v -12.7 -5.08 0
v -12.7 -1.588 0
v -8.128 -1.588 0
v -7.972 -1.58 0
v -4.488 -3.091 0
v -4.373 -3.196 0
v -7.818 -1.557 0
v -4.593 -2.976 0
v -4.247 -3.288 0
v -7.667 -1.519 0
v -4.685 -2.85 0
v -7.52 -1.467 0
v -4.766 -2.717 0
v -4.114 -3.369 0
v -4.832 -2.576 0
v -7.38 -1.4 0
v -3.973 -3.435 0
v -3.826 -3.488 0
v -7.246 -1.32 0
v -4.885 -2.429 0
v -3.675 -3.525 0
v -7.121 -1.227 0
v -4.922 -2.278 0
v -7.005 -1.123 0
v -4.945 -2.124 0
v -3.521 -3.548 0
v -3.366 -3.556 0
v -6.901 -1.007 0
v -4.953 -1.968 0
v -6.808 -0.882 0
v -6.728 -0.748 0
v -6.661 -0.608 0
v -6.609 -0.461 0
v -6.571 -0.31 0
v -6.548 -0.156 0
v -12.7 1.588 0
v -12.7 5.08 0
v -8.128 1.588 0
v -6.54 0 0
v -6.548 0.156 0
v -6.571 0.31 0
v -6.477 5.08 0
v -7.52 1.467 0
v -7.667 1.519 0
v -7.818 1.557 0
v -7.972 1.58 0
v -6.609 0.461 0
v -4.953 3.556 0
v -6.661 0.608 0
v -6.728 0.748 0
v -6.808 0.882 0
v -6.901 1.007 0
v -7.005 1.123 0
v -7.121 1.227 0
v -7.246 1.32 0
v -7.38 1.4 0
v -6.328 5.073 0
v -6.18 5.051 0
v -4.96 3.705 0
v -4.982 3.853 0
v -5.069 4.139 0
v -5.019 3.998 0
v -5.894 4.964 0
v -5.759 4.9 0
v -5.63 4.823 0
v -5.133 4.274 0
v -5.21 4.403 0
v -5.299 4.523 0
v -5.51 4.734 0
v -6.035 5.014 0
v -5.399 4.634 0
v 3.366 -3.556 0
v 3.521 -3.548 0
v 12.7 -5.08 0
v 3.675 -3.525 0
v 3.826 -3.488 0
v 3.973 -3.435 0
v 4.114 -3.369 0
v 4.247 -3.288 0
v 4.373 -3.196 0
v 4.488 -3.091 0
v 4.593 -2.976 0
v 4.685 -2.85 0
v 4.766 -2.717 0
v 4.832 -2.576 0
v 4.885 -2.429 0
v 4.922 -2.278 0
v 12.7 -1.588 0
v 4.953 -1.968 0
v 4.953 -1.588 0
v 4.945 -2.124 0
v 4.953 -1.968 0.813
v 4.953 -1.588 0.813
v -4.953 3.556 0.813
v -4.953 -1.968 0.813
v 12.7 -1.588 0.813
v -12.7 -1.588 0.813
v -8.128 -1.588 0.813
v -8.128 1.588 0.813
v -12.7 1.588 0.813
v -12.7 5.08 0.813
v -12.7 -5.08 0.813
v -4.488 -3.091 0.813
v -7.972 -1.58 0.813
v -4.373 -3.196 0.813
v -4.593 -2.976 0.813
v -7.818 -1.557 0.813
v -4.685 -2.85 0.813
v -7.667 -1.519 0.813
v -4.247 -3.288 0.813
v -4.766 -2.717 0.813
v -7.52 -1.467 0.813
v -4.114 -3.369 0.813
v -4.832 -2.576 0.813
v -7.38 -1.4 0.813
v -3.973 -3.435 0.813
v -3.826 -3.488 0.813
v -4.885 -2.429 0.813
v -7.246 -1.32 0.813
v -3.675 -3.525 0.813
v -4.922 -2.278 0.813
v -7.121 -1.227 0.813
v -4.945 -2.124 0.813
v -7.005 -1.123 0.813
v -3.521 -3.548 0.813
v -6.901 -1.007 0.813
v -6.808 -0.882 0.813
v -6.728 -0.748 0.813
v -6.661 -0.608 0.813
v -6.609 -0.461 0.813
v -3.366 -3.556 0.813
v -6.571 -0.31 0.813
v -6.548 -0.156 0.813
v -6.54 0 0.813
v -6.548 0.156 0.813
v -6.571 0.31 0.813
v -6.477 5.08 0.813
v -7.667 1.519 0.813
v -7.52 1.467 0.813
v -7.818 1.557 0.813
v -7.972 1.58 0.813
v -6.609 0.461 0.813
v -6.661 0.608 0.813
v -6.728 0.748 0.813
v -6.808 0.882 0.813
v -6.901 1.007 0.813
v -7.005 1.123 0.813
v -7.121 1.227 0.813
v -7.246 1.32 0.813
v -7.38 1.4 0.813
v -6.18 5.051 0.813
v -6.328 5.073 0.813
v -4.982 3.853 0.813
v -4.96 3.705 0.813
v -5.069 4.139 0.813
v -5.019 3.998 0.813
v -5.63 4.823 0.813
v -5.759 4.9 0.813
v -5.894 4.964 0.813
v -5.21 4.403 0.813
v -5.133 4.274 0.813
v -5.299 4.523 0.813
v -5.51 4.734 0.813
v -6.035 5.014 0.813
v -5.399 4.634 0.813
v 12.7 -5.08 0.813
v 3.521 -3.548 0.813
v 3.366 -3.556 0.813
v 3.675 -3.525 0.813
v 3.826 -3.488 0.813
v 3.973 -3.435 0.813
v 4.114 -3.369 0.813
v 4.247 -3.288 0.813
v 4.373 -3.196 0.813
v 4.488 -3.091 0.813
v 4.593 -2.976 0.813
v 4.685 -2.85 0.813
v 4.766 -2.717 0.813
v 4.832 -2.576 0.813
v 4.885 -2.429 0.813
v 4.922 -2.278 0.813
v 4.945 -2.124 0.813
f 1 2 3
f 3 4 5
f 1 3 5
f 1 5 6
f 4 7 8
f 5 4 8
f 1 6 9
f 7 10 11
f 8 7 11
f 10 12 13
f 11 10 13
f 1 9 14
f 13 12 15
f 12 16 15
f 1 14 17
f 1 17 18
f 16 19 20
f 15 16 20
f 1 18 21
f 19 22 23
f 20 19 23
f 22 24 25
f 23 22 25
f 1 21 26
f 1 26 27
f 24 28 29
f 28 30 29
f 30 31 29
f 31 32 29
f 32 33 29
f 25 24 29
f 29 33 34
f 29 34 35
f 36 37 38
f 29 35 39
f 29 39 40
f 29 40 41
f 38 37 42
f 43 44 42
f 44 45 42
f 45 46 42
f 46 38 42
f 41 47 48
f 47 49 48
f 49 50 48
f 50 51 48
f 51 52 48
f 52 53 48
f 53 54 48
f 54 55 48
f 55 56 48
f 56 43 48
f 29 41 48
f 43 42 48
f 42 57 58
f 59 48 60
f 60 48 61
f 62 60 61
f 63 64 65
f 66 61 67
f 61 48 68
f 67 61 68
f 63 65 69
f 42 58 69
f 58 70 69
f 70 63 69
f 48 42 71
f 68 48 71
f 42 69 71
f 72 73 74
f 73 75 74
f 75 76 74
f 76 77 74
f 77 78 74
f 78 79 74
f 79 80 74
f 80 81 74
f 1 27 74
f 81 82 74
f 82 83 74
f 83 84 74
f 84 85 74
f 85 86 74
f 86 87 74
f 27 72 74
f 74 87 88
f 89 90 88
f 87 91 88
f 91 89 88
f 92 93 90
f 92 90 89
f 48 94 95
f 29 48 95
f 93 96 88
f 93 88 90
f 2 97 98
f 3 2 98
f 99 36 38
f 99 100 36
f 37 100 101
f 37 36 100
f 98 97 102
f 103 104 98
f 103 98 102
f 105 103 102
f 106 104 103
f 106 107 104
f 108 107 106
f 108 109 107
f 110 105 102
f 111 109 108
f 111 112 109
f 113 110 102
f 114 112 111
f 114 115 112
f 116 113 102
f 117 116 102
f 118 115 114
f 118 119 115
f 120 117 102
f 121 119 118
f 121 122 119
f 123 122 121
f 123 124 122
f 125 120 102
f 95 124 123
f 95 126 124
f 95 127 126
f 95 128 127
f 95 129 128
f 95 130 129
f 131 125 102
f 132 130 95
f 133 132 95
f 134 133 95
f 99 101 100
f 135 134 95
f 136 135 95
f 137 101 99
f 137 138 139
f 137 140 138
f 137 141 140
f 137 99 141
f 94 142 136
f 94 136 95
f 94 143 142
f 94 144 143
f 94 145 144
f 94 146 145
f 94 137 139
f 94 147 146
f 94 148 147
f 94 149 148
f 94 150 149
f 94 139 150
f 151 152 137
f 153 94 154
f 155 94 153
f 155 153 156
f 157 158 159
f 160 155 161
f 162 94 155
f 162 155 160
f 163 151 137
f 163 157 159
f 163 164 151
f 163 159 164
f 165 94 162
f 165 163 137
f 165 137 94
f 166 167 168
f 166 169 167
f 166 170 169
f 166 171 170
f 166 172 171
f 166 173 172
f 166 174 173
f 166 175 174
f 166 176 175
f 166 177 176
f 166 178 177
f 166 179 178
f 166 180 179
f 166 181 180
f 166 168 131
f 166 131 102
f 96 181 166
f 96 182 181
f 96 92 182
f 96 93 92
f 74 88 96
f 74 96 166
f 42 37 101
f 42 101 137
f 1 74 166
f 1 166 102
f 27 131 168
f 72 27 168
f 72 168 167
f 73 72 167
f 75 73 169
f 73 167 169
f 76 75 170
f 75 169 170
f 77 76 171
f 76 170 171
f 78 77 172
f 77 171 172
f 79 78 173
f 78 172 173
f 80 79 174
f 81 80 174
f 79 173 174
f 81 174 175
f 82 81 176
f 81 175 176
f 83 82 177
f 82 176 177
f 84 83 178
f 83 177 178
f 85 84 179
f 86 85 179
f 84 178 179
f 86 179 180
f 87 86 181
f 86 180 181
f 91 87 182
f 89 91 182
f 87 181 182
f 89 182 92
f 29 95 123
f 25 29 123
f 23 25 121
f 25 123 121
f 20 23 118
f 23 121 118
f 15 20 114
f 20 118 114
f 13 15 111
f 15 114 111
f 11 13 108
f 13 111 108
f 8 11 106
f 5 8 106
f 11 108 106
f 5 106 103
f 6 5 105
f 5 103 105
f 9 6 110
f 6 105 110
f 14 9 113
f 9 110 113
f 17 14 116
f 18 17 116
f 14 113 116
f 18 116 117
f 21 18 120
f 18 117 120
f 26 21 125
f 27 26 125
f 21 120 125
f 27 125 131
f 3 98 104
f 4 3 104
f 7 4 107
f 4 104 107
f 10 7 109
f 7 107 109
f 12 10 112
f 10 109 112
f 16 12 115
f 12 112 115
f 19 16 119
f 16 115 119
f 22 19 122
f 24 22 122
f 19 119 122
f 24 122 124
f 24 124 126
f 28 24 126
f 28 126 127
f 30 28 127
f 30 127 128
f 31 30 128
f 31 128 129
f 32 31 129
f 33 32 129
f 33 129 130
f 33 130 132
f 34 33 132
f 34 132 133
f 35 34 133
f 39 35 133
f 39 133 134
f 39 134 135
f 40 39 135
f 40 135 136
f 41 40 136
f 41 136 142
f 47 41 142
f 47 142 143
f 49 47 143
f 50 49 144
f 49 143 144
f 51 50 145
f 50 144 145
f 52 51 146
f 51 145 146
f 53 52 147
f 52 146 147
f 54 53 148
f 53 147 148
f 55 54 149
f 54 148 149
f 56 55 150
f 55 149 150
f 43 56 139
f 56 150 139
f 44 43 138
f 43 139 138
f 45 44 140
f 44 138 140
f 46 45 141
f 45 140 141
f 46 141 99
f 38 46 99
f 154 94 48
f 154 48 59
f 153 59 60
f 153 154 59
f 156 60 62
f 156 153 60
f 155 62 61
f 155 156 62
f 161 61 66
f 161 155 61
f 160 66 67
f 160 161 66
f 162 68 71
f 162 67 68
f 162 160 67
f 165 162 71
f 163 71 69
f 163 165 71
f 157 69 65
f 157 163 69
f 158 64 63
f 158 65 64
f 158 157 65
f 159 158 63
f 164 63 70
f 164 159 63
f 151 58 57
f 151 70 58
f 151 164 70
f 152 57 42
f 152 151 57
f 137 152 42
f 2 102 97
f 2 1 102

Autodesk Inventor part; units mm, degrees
ref_plane "YZ Plane" through (0, 0, 0) normal (1, 0, 0) x (0, 1, 0)
ref_plane "XZ Plane" through (0, 0, 0) normal (0, 1, 0) x (-1, 0, 0)
sketch "Sketch1" plane through (0, 0, 0) normal (0, 0, 1) x (1, 0, 0)
  line L0 (-12.7, 5.08) -> (12.7, 5.08)
  line L1 (12.7, 5.08) -> (12.7, -5.08)
  line L2 (12.7, -5.08) -> (-12.7, -5.08)
  line L3 (-12.7, -5.08) -> (-12.7, 5.08)
  point P0 (0, 0)
  point P1 (0, 5.08)
  point P2 (-12.7, 0)
  dimension "d0" = 25.4
  dimension "d1" = 10.16
extrude "Extrusion1" add sketch "Sketch1" along normal blind 0.8128
ref_plane "Work Plane1" through (0, 0, 13.5128) normal (0, 0, 1) x (1, 0, 0)
sketch "Sketch2" plane through (0, 0, 13.5128) normal (0, 0, 1) x (1, 0, 0)
  line L0 (12.7, 5.08) -> (12.7, -5.08) projected
  line L1 (-12.7, 5.08) -> (12.7, 5.08) projected
  line L2 (-12.7, -5.08) -> (-12.7, 5.08) projected
  line L3 (12.7, -5.08) -> (-12.7, -5.08) projected
  line L4 (-3.3655, 3.556) -> (3.3655, 3.556)
  line L5 (-3.3655, -3.556) -> (3.3655, -3.556)
  line L6 (-4.953, 1.9685) -> (-4.953, -1.9685)
  line L7 (4.953, 1.9685) -> (4.953, -1.9685)
  arc A0 (-3.3655, 3.556) -> (-4.953, 1.9685) centre (-3.3655, 1.9685) ccw
  arc A1 (-4.953, -1.9685) -> (-3.3655, -3.556) centre (-3.3655, -1.9685) ccw
  arc A2 (3.3655, -3.556) -> (4.953, -1.9685) centre (3.3655, -1.9685) ccw
  arc A3 (4.953, 1.9685) -> (3.3655, 3.556) centre (3.3655, 1.9685) ccw
  point P0 (0, 0)
  point P1 (0, 3.556)
  point P2 (0, -3.556)
  point P3 (-4.953, 0)
  point P4 (4.953, 0)
  dimension "d5" = 6.731
  dimension "d6" = 6.731
  dimension "d7" = 3.937
  dimension "d8" = 3.937
  dimension "d9" = 4.953
  dimension "d10" = 4.953
  dimension "d11" = 3.556
  dimension "d12" = 3.556
  dimension "d13" = 1.5875
  dimension "d14" = 1.5875
  dimension "d15" = 1.5875
  dimension "d16" = 1.5875
extrude "Extrusion2" cut sketch "Sketch2" against normal blind 25.4 contours L4 A3 L7 A2 L5 A1 L6 A0
sketch "Sketch3" plane through (0, 0, 13.5128) normal (0, 0, 1) x (1, 0, 0)
  arc A0 (-3.3655, 3.556) -> (-4.953, 1.9685) centre (-3.3655, 1.9685) ccw projected
  line L0 (-3.3655, 3.556) -> (3.3655, 3.556) projected
  arc A1 (4.953, 1.9685) -> (3.3655, 3.556) centre (3.3655, 1.9685) ccw projected
  line L1 (4.953, 1.9685) -> (4.953, -1.9685) projected
  arc A2 (3.3655, -3.556) -> (4.953, -1.9685) centre (3.3655, -1.9685) ccw projected
  line L2 (3.3655, -3.556) -> (-3.3655, -3.556) projected
  arc A3 (-4.953, -1.9685) -> (-3.3655, -3.556) centre (-3.3655, -1.9685) ccw projected
  line L3 (-4.953, -1.9685) -> (-4.953, 1.9685) projected
  line L4 (12.7, 5.08) -> (12.7, -5.08) projected
  line L5 (-12.7, 5.08) -> (12.7, 5.08) projected
  line L6 (-12.7, -5.08) -> (-12.7, 5.08) projected
  line L7 (12.7, -5.08) -> (-12.7, -5.08) projected
  line L8 (-12.7, 1.5875) -> (-8.128, 1.5875)
  line L9 (-12.7, -1.5875) -> (-8.128, -1.5875)
  arc A4 (-8.128, -1.5875) -> (-8.128, 1.5875) centre (-8.128, 0) ccw
  point P0 (0, 0)
  dimension "d19" = 4.572
  dimension "d20" = 3.4925
  dimension "d21" = 4.572
  dimension "d22" = 3.175
  dimension "d24" = 1.5875
extrude "Extrusion3" cut sketch "Sketch3" against normal blind 25.4 contours L8 A4 L9 L6
mirror "Mirror1" about plane through (0, 0, 0) normal (1, 0, 0) of "Extrusion3"
sketch "Sketch5" plane through (0, 0, 0.8128) normal (0, 0, 1) x (1, 0, 0)
  line L0 (4.953, 1.9685) -> (4.953, -1.9685) construction
  line L1 (-4.953, -1.9685) -> (4.953, -1.9685)
  line L2 (4.953, -1.9685) -> (4.953, 7.0011)
  line L3 (4.953, 7.0011) -> (-4.953, 7.0011)
  line L4 (-4.953, 7.0011) -> (-4.953, -1.9685)
  point P0 (0, 0)
extrude "Extrusion5" cut sketch "Sketch5" against normal blind 25.4
fillet "Fillet1" radius 1.524 2 edges at (-4.953, 5.08, 0.4064) (4.953, 5.08, 0.4064)
sketch "Sketch7" plane through (0, 0, 0.8128) normal (0, 0, 1) x (1, 0, 0)
  line L0 (8.128, -1.5875) -> (12.7, -1.5875) construction
  line L1 (12.7, -1.5875) -> (4.953, -1.5875)
  line L2 (4.953, -1.5875) -> (4.953, 5.08)
  line L3 (4.953, 5.08) -> (12.7, 5.08)
  line L4 (12.7, 5.08) -> (12.7, -1.5875)
  point P0 (0, 0)
extrude "Extrusion6" cut sketch "Sketch7" against normal through all
properties part number "headplate_largerCenter_frontsidecutout"
